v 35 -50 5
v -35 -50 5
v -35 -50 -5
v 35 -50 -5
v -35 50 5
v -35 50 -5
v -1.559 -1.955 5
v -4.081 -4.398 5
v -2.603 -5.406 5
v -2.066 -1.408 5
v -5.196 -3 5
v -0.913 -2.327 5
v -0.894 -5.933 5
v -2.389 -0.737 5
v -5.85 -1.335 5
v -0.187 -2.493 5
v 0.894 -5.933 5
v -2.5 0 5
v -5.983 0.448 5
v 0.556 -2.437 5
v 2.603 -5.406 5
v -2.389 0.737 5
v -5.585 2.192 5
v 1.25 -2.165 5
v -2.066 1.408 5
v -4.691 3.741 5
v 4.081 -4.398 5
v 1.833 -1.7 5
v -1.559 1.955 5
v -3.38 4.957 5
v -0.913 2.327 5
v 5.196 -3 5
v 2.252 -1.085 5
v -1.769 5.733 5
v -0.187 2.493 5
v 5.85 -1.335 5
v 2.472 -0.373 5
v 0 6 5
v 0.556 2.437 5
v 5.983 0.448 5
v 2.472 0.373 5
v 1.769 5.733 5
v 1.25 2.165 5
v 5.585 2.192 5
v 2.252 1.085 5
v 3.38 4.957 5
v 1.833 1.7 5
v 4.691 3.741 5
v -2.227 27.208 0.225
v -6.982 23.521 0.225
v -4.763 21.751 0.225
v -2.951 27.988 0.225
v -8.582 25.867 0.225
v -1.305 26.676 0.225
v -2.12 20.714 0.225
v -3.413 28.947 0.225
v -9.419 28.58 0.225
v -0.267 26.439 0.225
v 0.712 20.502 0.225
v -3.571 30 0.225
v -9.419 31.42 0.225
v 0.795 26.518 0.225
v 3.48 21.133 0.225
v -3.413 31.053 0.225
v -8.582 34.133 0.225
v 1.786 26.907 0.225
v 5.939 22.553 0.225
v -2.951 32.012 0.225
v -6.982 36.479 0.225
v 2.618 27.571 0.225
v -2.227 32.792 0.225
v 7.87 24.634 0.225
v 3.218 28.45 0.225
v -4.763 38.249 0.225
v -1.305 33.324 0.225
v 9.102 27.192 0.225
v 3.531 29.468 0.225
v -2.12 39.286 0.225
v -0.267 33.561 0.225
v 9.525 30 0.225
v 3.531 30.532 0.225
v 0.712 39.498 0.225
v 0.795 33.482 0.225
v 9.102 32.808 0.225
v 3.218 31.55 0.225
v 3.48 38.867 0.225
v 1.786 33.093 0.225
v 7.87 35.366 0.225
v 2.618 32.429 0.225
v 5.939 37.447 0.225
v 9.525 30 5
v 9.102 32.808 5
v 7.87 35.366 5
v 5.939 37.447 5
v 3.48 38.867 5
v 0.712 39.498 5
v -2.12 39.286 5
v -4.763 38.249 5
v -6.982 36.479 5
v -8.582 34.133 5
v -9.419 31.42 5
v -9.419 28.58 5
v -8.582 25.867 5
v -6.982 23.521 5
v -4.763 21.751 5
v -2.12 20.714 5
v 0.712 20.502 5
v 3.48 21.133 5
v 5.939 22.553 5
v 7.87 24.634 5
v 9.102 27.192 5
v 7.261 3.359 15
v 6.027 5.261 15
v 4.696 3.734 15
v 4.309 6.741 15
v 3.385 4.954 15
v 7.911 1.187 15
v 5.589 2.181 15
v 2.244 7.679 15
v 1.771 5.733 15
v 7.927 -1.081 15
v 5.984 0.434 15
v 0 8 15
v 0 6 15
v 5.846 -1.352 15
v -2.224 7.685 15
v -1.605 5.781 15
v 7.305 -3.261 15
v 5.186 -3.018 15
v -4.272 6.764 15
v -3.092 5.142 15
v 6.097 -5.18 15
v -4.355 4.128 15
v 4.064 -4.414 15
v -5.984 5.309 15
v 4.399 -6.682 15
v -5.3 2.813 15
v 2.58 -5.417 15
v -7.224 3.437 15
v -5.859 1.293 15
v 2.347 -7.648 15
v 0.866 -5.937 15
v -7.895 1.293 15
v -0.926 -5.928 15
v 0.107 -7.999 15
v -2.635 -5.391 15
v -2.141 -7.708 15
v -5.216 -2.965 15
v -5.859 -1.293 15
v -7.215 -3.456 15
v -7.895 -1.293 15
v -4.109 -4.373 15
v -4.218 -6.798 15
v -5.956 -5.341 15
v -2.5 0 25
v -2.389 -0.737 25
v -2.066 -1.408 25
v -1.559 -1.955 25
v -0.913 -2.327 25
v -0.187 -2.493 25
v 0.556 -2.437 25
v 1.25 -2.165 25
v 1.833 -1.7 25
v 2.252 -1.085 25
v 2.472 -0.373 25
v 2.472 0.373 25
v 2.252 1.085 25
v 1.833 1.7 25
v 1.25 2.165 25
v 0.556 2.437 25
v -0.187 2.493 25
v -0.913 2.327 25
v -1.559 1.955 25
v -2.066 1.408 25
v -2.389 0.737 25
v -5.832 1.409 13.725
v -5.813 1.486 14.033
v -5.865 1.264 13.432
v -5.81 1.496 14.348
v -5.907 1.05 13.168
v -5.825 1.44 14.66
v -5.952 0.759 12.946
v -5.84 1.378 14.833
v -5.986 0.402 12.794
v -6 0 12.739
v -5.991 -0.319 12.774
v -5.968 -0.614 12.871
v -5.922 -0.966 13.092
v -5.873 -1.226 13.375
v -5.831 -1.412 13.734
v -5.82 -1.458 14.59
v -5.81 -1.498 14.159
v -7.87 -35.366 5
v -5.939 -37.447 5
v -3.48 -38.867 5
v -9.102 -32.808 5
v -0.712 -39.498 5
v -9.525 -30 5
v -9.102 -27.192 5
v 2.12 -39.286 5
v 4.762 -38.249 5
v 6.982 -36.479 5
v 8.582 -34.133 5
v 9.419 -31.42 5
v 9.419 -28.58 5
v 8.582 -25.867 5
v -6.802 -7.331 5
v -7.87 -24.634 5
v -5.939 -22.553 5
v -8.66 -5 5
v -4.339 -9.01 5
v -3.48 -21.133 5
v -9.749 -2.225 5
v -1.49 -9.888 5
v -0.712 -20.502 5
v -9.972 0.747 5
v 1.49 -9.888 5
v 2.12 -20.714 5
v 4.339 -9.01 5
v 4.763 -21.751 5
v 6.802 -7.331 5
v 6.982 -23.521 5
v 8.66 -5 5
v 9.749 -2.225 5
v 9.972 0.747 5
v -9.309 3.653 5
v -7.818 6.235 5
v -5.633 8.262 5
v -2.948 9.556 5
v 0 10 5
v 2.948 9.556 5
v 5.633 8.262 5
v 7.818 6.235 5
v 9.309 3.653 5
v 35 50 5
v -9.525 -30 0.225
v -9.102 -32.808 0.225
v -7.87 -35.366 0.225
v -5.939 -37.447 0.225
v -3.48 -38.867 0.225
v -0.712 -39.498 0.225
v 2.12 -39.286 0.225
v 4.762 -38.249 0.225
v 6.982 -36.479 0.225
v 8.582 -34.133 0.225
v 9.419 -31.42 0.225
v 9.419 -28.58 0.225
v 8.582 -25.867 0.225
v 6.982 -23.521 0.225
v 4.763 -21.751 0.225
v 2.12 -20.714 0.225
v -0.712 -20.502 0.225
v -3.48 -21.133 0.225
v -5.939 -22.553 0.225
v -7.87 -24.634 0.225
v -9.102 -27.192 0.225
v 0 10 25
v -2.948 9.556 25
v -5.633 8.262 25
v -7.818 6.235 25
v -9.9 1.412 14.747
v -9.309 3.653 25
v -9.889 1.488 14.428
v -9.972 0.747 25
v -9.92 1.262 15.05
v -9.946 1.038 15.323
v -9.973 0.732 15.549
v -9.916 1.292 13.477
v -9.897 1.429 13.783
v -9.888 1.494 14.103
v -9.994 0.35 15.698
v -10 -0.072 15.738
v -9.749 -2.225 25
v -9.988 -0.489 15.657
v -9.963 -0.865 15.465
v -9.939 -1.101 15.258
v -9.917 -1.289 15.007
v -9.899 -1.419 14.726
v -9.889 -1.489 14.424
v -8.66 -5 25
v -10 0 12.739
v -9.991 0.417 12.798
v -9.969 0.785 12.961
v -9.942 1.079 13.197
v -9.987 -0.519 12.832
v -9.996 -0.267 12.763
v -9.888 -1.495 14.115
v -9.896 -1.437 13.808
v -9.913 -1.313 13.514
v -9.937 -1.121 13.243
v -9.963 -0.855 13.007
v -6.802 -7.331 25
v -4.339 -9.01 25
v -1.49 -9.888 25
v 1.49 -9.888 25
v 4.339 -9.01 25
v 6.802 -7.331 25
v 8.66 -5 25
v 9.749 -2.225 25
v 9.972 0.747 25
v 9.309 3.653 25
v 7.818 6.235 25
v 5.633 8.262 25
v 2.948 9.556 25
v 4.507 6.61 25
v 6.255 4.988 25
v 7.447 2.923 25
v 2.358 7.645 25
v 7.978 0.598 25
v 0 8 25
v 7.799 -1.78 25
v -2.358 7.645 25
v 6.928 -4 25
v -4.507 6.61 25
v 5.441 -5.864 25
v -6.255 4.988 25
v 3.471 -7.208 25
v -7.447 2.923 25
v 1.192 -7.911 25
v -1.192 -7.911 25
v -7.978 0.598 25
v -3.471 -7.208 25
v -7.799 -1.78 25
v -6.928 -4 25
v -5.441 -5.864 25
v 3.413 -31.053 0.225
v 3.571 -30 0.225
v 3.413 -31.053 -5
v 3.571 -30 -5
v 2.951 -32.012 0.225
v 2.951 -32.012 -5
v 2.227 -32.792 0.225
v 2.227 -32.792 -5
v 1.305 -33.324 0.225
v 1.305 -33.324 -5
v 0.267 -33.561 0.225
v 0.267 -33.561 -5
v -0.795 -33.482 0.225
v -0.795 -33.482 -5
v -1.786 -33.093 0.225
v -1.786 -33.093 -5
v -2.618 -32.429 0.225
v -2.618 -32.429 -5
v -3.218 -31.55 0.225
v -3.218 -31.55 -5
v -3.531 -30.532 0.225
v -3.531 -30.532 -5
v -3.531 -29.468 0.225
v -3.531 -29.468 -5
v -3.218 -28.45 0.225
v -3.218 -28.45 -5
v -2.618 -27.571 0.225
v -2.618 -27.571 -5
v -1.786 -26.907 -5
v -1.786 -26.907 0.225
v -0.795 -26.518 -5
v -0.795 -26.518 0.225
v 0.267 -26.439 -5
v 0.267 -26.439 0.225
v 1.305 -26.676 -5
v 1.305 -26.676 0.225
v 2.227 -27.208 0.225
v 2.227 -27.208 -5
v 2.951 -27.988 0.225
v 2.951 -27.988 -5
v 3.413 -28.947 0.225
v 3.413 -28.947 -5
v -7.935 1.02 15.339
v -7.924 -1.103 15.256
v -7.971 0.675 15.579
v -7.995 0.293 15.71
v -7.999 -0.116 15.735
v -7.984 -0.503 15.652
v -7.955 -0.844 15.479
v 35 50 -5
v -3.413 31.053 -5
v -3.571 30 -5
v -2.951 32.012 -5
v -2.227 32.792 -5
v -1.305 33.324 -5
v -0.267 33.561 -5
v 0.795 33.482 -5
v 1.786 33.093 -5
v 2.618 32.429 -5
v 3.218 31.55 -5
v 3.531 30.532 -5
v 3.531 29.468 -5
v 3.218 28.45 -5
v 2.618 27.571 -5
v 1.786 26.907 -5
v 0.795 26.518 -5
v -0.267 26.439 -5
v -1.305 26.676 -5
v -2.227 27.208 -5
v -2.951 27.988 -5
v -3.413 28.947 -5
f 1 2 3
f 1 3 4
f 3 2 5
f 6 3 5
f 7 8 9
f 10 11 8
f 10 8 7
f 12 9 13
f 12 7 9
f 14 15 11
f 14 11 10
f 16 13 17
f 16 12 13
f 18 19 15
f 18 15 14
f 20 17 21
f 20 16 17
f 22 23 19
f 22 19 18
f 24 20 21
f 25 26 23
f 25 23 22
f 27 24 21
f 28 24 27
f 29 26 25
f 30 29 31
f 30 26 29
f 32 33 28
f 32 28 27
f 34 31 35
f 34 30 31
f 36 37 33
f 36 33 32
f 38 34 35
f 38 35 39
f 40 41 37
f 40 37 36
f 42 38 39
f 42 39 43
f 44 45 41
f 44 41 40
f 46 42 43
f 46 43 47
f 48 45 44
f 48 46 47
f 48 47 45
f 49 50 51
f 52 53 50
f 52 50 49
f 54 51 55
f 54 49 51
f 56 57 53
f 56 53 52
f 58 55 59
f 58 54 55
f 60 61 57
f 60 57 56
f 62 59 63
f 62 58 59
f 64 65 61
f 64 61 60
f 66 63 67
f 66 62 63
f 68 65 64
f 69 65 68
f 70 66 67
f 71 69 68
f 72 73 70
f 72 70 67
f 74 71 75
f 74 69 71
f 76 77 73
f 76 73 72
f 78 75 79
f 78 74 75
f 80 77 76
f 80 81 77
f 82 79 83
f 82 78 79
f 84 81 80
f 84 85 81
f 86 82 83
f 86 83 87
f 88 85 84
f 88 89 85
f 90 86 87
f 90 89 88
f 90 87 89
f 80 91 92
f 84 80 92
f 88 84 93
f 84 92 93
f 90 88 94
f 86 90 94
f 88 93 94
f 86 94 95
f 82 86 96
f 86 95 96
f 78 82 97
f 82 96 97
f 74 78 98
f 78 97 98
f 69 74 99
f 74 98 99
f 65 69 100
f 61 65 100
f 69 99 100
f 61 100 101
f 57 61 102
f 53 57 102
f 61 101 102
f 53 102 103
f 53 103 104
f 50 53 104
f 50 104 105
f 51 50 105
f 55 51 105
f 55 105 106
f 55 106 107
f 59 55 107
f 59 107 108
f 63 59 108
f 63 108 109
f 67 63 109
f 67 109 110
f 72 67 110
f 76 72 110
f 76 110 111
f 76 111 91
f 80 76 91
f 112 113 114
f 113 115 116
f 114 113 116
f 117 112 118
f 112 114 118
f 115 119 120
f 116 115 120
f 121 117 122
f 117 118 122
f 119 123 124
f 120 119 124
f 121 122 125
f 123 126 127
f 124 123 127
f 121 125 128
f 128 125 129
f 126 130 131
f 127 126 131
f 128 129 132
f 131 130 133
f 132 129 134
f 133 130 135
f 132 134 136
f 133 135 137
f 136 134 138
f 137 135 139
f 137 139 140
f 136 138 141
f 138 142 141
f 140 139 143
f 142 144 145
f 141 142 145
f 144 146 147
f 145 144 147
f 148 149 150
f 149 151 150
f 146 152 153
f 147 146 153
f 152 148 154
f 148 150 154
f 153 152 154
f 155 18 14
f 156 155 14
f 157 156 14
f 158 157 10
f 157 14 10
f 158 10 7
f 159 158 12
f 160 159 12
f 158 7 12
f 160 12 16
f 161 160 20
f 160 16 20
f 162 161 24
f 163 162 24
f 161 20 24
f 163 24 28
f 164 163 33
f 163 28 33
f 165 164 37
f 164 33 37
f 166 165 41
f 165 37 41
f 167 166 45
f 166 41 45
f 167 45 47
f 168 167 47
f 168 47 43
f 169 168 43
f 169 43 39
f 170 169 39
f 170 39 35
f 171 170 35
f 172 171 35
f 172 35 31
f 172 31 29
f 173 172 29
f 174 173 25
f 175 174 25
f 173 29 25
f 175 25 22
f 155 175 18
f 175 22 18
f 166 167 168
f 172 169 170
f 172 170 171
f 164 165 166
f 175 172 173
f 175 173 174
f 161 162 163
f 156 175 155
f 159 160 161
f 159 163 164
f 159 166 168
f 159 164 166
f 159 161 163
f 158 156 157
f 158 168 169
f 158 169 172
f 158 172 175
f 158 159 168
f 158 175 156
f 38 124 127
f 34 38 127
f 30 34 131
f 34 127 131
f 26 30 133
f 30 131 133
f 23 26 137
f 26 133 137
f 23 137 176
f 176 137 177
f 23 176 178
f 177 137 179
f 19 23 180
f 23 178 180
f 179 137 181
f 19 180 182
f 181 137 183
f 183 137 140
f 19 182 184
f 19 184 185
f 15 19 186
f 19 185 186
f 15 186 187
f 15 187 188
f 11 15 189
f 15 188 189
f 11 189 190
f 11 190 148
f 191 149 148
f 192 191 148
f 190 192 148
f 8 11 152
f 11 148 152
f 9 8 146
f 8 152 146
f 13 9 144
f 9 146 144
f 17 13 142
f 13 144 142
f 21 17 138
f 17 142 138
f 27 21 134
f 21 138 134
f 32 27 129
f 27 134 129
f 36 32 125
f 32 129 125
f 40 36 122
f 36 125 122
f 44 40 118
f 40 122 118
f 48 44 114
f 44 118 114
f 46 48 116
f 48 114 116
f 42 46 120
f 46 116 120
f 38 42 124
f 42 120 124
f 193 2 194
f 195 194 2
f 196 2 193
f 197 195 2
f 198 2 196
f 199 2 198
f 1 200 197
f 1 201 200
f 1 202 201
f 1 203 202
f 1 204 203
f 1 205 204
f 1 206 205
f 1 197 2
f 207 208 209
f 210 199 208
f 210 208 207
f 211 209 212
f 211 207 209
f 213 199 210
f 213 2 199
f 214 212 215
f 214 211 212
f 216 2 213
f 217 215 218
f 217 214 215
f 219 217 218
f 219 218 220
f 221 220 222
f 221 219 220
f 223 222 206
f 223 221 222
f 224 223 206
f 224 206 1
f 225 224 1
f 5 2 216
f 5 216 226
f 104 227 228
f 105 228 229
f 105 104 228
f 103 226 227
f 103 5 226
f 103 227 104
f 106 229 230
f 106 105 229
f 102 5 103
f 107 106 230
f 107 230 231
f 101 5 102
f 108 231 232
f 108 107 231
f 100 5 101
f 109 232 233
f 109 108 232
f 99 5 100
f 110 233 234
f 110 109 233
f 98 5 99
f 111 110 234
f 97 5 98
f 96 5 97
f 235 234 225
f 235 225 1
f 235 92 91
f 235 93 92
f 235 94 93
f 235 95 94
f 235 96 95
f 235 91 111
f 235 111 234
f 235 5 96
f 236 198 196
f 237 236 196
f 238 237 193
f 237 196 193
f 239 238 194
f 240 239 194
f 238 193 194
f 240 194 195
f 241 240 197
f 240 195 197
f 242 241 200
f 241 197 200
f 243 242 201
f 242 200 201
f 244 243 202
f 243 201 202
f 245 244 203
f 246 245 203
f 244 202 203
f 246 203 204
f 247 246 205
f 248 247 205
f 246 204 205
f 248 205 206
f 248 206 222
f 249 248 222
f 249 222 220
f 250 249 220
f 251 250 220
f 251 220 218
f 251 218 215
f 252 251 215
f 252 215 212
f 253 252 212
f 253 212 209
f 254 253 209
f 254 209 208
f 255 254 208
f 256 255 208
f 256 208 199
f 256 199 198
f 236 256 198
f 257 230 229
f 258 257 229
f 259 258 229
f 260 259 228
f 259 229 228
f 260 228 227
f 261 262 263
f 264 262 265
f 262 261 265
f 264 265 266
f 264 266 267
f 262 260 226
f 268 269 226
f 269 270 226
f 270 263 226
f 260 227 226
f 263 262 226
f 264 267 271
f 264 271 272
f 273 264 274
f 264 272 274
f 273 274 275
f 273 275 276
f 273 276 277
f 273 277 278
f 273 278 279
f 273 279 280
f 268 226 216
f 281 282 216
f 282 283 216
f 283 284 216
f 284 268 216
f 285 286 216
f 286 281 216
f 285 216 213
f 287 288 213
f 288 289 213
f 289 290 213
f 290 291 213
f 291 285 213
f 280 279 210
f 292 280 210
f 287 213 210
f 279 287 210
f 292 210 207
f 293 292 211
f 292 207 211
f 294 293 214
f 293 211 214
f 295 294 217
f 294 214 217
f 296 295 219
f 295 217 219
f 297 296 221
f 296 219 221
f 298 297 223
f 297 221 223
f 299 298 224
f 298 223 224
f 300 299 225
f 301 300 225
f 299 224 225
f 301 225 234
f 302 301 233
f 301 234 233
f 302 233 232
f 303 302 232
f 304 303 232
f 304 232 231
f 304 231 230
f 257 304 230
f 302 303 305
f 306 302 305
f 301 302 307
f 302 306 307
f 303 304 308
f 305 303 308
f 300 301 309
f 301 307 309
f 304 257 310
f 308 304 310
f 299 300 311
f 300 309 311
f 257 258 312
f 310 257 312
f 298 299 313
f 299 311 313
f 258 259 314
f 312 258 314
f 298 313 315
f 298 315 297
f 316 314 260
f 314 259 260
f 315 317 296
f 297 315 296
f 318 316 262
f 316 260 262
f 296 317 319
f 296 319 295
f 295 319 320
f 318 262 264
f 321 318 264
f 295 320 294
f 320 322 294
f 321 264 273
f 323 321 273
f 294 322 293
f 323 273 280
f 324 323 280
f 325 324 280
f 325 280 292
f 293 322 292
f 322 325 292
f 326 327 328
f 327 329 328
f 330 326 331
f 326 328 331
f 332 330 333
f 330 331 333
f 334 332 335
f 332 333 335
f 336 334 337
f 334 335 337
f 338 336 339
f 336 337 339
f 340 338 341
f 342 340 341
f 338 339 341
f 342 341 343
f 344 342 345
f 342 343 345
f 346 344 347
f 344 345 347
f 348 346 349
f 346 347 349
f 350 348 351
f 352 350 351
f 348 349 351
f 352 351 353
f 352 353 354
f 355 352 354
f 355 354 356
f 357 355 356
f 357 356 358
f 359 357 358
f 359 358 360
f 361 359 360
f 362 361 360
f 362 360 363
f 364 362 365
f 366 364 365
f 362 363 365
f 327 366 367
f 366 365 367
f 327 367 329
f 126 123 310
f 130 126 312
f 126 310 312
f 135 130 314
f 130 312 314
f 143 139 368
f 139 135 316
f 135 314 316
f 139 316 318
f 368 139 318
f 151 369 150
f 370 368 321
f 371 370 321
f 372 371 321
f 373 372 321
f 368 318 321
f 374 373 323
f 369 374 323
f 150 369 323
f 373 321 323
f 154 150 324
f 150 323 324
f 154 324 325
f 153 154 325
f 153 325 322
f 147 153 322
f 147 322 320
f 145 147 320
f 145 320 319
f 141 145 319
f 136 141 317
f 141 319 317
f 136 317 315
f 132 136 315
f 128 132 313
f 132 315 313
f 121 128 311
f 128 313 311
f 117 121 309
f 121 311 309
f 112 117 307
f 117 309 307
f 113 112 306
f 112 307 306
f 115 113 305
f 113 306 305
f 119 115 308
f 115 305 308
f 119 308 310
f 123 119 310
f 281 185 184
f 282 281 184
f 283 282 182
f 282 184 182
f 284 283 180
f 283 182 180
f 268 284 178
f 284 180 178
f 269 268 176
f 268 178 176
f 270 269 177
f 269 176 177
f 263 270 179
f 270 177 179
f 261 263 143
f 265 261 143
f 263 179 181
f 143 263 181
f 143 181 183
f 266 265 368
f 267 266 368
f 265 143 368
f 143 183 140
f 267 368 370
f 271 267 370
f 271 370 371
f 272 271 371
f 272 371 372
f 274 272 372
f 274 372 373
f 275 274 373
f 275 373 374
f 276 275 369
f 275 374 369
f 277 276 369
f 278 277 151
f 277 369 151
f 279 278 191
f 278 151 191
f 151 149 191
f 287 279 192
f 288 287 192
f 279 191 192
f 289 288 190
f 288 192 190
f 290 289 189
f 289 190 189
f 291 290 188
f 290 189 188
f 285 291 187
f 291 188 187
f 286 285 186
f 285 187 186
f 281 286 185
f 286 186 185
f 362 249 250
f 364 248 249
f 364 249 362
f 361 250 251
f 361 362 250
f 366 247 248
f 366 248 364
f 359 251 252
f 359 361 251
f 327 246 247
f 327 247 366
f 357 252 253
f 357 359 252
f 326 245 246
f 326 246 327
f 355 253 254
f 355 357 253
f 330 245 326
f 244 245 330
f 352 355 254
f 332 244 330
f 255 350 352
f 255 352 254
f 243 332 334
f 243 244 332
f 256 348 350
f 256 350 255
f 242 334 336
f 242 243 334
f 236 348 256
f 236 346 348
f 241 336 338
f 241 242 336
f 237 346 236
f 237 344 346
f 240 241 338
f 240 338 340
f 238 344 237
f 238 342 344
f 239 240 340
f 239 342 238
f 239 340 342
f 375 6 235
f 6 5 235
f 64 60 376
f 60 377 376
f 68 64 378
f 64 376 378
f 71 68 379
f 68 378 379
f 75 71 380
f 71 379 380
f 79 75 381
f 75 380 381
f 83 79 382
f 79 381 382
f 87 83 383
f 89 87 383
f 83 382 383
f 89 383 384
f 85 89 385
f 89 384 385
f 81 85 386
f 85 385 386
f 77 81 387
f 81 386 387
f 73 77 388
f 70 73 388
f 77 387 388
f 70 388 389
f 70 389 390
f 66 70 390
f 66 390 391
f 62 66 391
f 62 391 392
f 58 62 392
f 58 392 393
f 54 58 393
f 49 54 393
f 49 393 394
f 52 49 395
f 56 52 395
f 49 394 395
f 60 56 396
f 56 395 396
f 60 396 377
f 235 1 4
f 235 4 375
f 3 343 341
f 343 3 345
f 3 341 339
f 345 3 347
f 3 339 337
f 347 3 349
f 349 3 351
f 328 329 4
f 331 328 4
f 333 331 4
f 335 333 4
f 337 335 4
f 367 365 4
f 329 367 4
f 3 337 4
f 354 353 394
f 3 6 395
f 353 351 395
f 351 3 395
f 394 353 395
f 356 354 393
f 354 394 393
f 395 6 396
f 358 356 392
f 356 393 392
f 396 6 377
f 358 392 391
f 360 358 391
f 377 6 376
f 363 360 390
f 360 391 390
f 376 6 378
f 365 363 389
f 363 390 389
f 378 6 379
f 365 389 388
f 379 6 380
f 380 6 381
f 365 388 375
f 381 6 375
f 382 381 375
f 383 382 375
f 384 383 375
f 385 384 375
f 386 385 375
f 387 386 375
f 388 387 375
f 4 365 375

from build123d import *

# Parameters (mm, degrees)
SKETCH1_W                                = 70
SKETCH1_H                                = 100
BOSS_EXTRUDE1_DEPTH                      = 5
SKETCH3_R                                = 2.5
BOSS_EXTRUDE2_DEPTH                      = 20
CBORE_FOR_1_4_HEX_HEAD_BOLT1_D           = 7.14248
CBORE_FOR_1_4_HEX_HEAD_BOLT1_CBORE_D     = 19.05
CBORE_FOR_1_4_HEX_HEAD_BOLT1_CBORE_DEPTH = 4.7752
CIRPATTERN2_COUNT                        = 2
SKETCH8_R                                = 1.5
CUT_EXTRUDE2_DEPTH                       = 10


with BuildPart() as part:
    # Sketch1 → Boss-Extrude1 (new, symmetric)
    with BuildSketch(Plane.XY):
        Rectangle(SKETCH1_W, SKETCH1_H)
    extrude(amount=BOSS_EXTRUDE1_DEPTH, both=True)

    # Sketch3 → Boss-Extrude2 (add)
    with BuildSketch(Plane.XY.offset(5)):
        with Locations(Location((0, 0, 0), (0, 0, 180))):
            Circle(SKETCH3_R)
    extrude(amount=BOSS_EXTRUDE2_DEPTH)

    # Sketch5 → Revolve1 (revolve)
    with BuildSketch(Plane(origin=(0, 0, 0), x_dir=(0, 0, -1), z_dir=(1, 0, 0))):
        Polygon((-5, 6), (-15, 6), (-15, 8), (-25, 8), (-25, 10), (-5, 10), align=None)
    revolve(axis=Axis((0, 0, 0), (0, 0, 1)))

    # CBORE for 1/4 Hex Head Bolt1 (through all)
    with Locations(Plane(origin=(0, 30, 5), x_dir=(1, 0, 0), z_dir=(0, 0, 1))):
        with Locations((0, 0)):
            cbore_for_1_4_hex_head_bolt1 = CounterBoreHole(CBORE_FOR_1_4_HEX_HEAD_BOLT1_D / 2, CBORE_FOR_1_4_HEX_HEAD_BOLT1_CBORE_D / 2, CBORE_FOR_1_4_HEX_HEAD_BOLT1_CBORE_DEPTH)

    # CirPattern2: CBORE for 1/4 Hex Head Bolt1 ×2 about axis
    cirpattern2_axis = Axis((0, 0, 0), (0, 0, 1))
    for i in range(1, CIRPATTERN2_COUNT):
        add(cbore_for_1_4_hex_head_bolt1.rotate(cirpattern2_axis, i * 360 / CIRPATTERN2_COUNT), mode=Mode.SUBTRACT)

    # Sketch8 → Cut-Extrude2 (cut)
    with BuildSketch(Plane(origin=(-5, 0, 0), x_dir=(0, 0, -1), z_dir=(1, 0, 0))):
        with Locations((-14.239336727, 0)):
            Circle(SKETCH8_R)
    extrude(amount=-CUT_EXTRUDE2_DEPTH, mode=Mode.SUBTRACT)


solid = part.part
